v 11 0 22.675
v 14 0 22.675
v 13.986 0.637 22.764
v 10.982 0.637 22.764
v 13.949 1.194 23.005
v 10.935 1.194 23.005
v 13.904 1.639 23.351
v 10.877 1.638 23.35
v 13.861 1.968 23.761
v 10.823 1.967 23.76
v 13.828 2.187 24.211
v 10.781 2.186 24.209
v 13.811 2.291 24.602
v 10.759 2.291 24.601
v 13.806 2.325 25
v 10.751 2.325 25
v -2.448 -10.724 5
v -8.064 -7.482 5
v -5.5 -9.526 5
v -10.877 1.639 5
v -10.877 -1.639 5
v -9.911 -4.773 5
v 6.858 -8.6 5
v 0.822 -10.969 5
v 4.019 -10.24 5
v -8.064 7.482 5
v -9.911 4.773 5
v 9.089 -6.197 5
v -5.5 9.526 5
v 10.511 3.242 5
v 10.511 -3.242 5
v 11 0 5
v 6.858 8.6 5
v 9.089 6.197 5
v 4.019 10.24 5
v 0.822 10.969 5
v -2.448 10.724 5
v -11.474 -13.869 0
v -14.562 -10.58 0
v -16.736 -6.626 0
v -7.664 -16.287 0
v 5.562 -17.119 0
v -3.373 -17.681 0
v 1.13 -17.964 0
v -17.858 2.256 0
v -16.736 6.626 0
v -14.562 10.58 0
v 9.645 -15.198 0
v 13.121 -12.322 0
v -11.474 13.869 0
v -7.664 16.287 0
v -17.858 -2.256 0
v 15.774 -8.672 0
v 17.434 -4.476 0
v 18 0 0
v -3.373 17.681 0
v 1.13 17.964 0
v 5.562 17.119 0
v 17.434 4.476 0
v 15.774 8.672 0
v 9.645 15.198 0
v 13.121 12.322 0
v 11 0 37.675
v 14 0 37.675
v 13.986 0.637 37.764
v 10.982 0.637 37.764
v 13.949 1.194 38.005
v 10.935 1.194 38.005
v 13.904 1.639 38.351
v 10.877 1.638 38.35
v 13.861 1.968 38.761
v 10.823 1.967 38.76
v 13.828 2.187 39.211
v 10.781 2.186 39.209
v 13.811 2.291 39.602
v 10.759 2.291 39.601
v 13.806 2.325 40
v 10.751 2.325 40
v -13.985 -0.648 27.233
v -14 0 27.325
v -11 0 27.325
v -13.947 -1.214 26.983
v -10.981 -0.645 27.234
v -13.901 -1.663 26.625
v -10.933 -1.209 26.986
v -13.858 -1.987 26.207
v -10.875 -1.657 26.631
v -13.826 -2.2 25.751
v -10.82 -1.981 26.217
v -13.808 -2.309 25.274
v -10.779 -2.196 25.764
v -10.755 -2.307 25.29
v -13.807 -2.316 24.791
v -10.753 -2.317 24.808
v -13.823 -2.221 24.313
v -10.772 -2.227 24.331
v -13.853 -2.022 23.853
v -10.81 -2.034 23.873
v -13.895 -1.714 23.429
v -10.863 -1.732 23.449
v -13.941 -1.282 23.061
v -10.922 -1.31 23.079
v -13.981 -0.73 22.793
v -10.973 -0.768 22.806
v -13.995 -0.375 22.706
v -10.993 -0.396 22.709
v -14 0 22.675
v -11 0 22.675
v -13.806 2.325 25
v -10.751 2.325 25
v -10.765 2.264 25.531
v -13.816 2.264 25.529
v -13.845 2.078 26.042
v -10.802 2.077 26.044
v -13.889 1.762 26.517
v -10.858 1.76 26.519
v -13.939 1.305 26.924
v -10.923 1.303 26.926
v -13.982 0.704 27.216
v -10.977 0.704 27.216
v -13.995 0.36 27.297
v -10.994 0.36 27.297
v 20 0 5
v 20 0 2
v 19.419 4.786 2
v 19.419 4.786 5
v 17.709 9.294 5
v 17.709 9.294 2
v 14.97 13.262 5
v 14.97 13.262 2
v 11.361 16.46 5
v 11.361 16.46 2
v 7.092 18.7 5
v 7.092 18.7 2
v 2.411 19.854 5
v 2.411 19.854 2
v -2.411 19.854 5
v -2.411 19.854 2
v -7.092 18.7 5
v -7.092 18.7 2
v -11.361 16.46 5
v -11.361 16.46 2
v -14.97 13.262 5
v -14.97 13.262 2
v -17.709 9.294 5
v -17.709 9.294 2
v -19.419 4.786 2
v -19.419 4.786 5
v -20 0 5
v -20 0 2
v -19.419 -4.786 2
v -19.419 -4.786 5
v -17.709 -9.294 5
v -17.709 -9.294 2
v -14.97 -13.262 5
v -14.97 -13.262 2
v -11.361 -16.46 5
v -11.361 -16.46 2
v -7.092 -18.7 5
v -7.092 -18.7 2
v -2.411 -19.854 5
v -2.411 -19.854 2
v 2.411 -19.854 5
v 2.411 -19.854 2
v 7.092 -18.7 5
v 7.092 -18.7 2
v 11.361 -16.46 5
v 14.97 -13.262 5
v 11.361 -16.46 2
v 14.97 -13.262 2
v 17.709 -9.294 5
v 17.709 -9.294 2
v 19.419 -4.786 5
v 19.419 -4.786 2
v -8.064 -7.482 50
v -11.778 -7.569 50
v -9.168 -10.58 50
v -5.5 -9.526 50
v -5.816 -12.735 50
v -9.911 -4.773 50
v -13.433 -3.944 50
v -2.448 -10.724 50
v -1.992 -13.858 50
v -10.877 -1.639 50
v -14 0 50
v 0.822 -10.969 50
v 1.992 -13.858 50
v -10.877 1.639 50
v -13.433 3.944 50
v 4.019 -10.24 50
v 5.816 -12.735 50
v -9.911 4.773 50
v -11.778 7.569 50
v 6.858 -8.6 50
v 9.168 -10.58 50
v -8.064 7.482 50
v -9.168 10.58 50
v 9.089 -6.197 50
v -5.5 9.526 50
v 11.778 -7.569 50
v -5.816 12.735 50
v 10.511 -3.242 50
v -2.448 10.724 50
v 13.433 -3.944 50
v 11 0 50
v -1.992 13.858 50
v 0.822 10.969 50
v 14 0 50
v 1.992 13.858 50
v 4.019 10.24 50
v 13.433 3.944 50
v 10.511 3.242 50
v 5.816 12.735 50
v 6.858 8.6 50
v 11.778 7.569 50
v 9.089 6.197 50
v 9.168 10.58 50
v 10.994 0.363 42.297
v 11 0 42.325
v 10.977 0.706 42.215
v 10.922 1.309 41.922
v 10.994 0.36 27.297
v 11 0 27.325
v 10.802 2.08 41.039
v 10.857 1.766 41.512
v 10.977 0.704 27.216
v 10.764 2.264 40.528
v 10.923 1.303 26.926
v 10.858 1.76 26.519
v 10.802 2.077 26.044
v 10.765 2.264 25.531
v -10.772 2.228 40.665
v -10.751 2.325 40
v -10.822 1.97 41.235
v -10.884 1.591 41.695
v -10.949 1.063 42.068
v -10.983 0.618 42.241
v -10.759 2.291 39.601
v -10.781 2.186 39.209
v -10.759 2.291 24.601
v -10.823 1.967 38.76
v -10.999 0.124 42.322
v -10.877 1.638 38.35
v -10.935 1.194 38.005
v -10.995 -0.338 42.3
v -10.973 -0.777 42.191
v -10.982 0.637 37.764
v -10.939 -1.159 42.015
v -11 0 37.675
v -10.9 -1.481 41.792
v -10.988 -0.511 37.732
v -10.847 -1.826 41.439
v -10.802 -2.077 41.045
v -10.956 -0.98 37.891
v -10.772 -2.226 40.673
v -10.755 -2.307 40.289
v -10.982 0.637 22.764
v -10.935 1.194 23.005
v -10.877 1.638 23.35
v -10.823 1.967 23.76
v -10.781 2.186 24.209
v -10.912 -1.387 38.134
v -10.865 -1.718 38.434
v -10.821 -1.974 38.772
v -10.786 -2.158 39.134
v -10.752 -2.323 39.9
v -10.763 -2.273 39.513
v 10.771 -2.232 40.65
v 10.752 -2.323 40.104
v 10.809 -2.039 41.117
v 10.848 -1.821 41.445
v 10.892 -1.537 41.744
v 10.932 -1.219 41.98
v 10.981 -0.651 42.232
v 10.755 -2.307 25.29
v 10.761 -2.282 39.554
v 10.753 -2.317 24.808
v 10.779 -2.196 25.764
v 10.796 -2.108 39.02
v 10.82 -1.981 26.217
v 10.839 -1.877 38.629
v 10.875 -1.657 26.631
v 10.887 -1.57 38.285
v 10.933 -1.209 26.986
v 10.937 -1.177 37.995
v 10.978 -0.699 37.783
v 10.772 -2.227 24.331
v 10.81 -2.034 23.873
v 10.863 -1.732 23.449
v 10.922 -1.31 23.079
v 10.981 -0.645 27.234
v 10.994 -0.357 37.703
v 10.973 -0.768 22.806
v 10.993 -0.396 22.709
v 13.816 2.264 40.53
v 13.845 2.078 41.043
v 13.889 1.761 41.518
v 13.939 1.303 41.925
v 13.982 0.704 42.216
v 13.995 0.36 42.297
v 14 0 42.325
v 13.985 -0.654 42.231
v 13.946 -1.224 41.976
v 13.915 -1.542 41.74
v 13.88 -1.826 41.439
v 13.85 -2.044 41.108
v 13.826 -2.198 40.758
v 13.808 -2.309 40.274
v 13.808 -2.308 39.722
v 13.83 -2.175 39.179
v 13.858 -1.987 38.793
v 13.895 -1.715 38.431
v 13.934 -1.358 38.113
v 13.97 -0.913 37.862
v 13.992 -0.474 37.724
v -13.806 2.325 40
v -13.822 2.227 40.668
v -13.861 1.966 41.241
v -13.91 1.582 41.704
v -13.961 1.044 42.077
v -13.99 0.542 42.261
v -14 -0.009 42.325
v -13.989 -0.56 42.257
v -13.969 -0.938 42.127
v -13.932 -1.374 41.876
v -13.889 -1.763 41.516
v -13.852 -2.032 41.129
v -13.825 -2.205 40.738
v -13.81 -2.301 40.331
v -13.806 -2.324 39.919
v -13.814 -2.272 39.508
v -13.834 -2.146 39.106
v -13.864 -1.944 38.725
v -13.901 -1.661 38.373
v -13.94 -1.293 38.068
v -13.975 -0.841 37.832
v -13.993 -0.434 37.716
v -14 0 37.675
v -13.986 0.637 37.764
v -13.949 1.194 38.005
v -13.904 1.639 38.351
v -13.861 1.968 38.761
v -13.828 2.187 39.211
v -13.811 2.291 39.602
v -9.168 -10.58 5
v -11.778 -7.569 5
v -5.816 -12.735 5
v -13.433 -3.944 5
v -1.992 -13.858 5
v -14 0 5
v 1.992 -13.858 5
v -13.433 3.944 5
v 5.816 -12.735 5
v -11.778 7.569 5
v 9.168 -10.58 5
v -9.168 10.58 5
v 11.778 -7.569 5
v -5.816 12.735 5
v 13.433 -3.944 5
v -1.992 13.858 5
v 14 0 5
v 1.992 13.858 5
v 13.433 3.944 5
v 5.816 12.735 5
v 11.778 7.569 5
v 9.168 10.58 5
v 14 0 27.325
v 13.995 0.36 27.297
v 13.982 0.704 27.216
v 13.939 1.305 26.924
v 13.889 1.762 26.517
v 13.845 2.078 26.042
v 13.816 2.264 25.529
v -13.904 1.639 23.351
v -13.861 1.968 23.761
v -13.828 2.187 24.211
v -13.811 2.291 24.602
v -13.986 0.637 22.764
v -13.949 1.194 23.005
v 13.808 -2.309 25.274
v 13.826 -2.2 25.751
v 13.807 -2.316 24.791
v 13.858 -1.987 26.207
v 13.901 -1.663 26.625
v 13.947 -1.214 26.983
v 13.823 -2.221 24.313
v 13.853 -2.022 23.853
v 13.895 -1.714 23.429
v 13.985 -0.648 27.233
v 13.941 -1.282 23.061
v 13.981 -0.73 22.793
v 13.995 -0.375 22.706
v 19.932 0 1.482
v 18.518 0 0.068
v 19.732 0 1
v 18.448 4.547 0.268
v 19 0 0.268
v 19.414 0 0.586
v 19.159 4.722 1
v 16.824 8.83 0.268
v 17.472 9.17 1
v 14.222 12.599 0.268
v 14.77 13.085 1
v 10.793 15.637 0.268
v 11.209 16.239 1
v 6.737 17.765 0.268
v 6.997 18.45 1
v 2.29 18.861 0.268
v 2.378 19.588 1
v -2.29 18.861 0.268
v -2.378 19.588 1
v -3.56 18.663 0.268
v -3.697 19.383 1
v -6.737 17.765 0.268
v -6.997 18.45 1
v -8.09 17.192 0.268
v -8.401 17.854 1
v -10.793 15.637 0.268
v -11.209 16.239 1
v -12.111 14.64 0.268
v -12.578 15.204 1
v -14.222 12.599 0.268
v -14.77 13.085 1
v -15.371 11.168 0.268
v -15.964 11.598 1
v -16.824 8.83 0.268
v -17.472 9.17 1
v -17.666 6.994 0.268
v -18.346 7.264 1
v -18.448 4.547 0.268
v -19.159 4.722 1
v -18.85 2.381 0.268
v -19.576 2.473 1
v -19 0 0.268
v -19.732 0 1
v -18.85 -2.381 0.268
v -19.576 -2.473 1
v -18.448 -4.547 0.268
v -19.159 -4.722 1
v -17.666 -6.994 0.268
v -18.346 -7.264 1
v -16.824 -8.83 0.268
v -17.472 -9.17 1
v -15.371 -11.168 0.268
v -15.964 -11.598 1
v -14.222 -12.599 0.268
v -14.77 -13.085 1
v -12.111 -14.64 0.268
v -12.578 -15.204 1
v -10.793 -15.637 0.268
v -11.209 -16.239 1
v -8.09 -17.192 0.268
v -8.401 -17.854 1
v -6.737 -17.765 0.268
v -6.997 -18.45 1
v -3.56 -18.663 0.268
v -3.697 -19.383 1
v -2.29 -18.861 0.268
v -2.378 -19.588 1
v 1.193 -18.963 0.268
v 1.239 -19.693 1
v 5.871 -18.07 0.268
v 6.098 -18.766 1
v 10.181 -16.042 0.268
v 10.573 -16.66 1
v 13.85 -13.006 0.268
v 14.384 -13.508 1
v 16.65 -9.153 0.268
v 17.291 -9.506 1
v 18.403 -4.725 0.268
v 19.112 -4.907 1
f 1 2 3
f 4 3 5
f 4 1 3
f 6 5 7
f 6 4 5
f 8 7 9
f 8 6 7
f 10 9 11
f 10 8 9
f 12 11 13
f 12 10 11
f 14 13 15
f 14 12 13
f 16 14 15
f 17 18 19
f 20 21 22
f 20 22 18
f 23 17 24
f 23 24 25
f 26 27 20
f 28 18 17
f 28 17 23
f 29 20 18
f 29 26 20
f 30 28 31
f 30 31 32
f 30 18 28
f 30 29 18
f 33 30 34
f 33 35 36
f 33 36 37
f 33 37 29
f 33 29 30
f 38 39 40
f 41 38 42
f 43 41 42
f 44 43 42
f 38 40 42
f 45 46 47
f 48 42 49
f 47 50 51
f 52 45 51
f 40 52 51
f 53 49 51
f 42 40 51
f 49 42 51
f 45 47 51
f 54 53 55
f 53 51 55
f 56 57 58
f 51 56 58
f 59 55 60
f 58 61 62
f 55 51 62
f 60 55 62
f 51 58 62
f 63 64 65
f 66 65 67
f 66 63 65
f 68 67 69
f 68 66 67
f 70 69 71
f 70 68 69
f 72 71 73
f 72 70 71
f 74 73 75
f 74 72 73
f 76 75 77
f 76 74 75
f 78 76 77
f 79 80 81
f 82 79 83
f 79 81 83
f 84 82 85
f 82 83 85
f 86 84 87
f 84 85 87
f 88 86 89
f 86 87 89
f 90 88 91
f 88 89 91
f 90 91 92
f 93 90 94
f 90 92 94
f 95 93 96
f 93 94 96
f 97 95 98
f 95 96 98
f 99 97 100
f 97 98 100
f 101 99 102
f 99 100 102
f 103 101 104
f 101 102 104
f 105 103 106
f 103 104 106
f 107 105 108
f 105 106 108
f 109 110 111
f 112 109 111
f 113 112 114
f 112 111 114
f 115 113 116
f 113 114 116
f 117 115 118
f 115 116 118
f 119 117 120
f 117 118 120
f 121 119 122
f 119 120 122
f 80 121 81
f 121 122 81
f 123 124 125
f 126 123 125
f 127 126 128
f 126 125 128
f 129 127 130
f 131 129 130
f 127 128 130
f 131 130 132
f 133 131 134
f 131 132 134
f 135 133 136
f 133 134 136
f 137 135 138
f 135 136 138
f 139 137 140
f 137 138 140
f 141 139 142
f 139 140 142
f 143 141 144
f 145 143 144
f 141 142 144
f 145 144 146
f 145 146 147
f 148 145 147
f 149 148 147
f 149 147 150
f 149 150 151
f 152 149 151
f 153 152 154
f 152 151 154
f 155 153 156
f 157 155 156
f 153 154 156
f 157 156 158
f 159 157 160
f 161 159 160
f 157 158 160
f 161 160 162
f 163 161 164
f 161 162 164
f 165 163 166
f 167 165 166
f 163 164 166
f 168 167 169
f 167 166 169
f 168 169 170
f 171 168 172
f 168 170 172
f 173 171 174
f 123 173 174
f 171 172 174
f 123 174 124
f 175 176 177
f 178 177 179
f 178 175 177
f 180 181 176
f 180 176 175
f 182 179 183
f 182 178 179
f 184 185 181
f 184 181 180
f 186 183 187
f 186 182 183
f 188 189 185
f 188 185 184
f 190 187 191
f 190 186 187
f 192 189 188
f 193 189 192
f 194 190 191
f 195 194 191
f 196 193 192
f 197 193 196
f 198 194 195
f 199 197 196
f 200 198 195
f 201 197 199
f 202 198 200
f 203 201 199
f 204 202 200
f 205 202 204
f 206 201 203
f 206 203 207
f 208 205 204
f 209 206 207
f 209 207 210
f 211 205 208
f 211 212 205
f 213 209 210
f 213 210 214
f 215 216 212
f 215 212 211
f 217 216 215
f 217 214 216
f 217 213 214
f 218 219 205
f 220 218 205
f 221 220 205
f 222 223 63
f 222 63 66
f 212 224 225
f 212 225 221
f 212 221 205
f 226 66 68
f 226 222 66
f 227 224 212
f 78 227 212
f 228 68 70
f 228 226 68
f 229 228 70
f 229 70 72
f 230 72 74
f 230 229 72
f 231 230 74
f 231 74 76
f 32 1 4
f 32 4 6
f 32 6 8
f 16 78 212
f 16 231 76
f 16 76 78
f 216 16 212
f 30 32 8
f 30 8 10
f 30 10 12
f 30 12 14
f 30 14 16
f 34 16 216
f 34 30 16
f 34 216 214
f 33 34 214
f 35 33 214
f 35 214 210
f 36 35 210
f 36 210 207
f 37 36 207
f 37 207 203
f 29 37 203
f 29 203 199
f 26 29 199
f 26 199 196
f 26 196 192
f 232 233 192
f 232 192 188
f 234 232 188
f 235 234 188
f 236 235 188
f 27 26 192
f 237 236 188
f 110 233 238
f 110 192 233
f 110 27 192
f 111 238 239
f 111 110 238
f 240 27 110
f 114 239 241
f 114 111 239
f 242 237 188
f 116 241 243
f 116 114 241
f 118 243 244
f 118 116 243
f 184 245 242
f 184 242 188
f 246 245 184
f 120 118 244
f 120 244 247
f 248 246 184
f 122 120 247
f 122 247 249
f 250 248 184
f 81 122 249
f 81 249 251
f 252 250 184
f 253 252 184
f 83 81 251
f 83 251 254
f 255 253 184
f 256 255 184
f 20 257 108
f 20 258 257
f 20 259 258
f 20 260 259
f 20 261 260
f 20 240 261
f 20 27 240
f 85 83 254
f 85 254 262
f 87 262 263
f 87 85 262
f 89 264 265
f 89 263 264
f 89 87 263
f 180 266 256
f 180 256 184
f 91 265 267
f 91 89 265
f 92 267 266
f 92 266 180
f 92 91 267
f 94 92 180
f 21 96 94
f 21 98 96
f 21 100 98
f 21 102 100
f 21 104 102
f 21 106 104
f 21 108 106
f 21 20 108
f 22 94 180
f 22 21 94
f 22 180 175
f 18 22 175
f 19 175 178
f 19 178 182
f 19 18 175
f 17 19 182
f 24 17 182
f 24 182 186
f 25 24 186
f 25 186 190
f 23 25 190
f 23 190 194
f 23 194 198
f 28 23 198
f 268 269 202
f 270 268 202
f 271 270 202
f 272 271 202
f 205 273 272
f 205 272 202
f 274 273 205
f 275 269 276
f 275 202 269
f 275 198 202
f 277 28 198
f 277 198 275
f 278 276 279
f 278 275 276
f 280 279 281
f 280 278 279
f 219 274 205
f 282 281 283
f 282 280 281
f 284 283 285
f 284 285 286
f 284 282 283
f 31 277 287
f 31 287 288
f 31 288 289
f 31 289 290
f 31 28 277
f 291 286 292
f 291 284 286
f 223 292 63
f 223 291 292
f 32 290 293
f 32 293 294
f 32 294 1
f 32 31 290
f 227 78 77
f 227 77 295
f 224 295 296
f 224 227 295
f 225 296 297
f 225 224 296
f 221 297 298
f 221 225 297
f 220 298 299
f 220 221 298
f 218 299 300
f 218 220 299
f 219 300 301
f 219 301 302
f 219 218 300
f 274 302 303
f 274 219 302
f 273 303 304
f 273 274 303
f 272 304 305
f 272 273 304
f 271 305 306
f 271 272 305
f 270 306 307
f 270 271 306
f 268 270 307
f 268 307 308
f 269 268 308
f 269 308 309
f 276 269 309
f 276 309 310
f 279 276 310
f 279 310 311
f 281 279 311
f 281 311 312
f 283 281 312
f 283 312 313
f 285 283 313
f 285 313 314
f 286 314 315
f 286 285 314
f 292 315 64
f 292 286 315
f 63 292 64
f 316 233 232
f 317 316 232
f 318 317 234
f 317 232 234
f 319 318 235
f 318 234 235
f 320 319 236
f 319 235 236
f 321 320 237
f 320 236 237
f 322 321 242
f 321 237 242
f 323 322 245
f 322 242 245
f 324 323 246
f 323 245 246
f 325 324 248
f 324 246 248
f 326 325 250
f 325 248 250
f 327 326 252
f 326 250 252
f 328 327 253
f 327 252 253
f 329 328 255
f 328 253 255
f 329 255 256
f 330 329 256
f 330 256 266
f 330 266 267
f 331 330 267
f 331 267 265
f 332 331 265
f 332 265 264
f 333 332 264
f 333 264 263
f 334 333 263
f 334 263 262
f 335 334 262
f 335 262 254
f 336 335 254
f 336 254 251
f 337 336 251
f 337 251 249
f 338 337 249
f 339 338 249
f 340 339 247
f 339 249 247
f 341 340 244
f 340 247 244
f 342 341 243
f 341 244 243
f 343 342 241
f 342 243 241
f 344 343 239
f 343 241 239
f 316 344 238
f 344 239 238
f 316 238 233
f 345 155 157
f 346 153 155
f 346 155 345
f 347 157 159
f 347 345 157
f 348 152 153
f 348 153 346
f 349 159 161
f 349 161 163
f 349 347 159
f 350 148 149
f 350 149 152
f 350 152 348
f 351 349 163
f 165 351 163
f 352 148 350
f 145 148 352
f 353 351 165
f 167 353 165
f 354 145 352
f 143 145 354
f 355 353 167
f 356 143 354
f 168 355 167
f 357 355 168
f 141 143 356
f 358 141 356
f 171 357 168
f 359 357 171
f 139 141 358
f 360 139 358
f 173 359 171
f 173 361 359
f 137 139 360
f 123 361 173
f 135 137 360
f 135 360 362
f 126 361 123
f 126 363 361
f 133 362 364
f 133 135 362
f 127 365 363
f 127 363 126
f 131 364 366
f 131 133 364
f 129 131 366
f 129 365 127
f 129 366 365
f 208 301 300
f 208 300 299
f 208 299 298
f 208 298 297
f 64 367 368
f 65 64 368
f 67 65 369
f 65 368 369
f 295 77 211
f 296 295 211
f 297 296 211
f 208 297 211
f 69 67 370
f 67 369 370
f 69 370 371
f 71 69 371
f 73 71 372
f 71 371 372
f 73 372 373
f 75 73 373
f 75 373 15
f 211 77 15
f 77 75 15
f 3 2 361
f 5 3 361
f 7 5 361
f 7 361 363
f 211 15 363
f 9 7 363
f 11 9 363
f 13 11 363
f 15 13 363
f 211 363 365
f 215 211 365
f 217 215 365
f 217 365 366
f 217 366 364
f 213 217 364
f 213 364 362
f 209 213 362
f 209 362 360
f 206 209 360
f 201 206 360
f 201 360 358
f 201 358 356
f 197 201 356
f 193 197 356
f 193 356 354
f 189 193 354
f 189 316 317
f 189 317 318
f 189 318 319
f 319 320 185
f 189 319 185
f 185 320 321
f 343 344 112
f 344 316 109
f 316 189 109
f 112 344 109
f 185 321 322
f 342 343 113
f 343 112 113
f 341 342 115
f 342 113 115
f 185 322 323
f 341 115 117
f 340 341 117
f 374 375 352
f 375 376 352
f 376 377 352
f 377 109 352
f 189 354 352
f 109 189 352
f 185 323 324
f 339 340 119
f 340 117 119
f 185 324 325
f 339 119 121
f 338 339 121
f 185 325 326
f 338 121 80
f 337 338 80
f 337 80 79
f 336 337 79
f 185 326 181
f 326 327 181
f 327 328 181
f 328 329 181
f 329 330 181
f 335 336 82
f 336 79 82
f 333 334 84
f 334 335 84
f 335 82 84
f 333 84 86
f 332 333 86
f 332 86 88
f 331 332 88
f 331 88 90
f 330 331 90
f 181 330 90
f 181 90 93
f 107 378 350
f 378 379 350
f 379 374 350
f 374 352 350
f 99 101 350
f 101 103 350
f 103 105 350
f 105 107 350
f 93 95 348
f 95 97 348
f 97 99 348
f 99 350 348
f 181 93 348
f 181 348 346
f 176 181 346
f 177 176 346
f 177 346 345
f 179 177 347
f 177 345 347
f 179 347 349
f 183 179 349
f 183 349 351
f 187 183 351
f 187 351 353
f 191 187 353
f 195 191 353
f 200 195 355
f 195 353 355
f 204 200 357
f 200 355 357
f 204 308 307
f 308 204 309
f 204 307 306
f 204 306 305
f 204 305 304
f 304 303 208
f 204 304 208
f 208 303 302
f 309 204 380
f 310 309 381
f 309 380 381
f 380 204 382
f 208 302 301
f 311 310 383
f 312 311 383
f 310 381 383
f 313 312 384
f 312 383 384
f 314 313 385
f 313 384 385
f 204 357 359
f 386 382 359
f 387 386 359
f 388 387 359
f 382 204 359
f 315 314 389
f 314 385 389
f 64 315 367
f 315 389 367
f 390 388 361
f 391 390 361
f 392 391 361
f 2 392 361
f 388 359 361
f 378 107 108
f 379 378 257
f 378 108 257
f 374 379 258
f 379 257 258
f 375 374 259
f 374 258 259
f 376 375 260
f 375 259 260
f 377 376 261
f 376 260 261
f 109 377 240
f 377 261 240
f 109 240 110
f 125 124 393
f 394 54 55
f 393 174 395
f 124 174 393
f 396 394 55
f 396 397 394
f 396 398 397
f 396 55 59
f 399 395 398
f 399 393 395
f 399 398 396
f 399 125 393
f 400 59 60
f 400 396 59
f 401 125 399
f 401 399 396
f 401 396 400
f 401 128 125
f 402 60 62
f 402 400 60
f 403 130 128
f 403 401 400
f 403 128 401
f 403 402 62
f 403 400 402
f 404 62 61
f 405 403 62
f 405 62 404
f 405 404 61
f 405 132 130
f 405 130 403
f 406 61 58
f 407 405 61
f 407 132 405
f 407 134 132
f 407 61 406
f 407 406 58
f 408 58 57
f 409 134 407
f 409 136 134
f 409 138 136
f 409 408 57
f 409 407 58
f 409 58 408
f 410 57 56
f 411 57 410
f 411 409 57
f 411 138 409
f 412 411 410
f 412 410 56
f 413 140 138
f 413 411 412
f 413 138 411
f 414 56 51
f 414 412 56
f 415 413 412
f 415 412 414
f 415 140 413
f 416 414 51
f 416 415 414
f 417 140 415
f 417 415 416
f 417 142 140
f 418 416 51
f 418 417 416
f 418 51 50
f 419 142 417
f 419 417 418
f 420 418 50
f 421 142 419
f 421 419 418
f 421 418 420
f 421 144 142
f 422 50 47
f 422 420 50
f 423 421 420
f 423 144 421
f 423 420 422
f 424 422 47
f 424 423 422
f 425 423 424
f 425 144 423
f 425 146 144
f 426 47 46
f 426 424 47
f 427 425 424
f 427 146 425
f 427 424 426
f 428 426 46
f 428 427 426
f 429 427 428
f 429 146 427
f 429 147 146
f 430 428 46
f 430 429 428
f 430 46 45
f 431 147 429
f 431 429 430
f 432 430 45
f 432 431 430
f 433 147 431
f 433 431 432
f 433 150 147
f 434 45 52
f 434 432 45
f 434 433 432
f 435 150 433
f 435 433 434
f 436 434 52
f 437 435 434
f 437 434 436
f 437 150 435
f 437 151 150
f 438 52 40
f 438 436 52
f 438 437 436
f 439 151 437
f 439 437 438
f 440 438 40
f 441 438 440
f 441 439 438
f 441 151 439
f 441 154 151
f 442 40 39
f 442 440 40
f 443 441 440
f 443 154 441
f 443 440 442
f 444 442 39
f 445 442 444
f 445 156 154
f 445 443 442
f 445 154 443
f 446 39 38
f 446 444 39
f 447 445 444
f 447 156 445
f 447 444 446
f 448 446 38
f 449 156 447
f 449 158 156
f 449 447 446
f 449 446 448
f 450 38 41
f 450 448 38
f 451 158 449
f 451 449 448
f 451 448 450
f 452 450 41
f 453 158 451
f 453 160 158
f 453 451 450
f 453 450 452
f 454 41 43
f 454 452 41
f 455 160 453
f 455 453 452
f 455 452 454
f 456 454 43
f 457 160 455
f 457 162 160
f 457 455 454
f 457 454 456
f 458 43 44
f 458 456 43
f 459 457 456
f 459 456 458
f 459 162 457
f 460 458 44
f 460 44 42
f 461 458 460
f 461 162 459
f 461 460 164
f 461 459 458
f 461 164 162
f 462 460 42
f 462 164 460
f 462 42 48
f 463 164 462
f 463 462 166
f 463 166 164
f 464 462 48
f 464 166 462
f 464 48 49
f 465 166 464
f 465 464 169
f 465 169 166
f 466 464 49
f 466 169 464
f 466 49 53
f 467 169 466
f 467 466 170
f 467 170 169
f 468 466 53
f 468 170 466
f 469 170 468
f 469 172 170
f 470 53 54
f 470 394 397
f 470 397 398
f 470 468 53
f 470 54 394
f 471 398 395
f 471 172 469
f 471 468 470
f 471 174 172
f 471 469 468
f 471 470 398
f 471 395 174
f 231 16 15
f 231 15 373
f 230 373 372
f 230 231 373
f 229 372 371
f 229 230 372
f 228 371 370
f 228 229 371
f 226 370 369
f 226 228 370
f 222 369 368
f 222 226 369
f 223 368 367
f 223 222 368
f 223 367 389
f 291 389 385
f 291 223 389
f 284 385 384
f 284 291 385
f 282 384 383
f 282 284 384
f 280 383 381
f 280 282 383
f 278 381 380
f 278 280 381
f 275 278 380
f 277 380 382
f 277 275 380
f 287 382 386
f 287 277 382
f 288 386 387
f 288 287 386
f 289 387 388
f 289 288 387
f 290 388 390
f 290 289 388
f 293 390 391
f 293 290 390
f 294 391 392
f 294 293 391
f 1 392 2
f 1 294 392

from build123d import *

# Parameters (mm, degrees)
F0_R          = 14
F0_R_2        = 11
F1_DEPTH      = 50
F0_R_3        = 20
F2_DEPTH      = 5
F3_DEPTH      = 5
F4_R          = 2
F6_DEPTH      = 20.0010001
F6_DEPTH_BACK = 25


with BuildPart() as f1:
    # F0 (on Top) → F1 (new body)
    with BuildSketch(Plane.XY):
        Circle(F0_R)
        Circle(F0_R_2, mode=Mode.SUBTRACT)
    extrude(amount=F1_DEPTH)

    # F0 (on Top) → F2 (join)
    with BuildSketch(Plane.XY):
        Circle(F0_R_3)
        Circle(F0_R, mode=Mode.SUBTRACT)
    extrude(amount=F2_DEPTH)

    # F0 (on Top) → F3 (join)
    with BuildSketch(Plane.XY):
        Circle(F0_R_2)
    extrude(amount=F3_DEPTH)

    # F4
    f4_edges = [f1.edges().sort_by_distance(p)[0] for p in [
        (-20, 0, 0),
    ]]
    fillet(f4_edges, radius=F4_R)

    # F5 (on Right) → F6 (cut, two sides)
    with BuildSketch(Plane.YZ) as f6_sk:
        with BuildLine():
            ThreePointArc((2.325, 40), (-1.6440232663, 41.6440232663), (0, 37.675))
            ThreePointArc((0, 37.675), (1.6440232663, 38.3559767337), (2.325, 40))
        make_face()
        with BuildLine():
            Line((0, 25), (0, 22.675))
            ThreePointArc((0, 22.675), (1.6440232663, 23.3559767337), (2.325, 25))
            ThreePointArc((2.325, 25), (1.6440232663, 26.6440232663), (0, 27.325))
            Line((0, 27.325), (0, 25))
        make_face()
        with BuildLine():
            ThreePointArc((0, 27.325), (-2.325, 25), (0, 22.675))
            Line((0, 22.675), (0, 25))
            Line((0, 25), (0, 27.325))
        make_face()
    extrude(amount=-F6_DEPTH, mode=Mode.SUBTRACT)
    extrude(f6_sk.sketch, amount=F6_DEPTH_BACK, mode=Mode.SUBTRACT)


solid = f1.part
